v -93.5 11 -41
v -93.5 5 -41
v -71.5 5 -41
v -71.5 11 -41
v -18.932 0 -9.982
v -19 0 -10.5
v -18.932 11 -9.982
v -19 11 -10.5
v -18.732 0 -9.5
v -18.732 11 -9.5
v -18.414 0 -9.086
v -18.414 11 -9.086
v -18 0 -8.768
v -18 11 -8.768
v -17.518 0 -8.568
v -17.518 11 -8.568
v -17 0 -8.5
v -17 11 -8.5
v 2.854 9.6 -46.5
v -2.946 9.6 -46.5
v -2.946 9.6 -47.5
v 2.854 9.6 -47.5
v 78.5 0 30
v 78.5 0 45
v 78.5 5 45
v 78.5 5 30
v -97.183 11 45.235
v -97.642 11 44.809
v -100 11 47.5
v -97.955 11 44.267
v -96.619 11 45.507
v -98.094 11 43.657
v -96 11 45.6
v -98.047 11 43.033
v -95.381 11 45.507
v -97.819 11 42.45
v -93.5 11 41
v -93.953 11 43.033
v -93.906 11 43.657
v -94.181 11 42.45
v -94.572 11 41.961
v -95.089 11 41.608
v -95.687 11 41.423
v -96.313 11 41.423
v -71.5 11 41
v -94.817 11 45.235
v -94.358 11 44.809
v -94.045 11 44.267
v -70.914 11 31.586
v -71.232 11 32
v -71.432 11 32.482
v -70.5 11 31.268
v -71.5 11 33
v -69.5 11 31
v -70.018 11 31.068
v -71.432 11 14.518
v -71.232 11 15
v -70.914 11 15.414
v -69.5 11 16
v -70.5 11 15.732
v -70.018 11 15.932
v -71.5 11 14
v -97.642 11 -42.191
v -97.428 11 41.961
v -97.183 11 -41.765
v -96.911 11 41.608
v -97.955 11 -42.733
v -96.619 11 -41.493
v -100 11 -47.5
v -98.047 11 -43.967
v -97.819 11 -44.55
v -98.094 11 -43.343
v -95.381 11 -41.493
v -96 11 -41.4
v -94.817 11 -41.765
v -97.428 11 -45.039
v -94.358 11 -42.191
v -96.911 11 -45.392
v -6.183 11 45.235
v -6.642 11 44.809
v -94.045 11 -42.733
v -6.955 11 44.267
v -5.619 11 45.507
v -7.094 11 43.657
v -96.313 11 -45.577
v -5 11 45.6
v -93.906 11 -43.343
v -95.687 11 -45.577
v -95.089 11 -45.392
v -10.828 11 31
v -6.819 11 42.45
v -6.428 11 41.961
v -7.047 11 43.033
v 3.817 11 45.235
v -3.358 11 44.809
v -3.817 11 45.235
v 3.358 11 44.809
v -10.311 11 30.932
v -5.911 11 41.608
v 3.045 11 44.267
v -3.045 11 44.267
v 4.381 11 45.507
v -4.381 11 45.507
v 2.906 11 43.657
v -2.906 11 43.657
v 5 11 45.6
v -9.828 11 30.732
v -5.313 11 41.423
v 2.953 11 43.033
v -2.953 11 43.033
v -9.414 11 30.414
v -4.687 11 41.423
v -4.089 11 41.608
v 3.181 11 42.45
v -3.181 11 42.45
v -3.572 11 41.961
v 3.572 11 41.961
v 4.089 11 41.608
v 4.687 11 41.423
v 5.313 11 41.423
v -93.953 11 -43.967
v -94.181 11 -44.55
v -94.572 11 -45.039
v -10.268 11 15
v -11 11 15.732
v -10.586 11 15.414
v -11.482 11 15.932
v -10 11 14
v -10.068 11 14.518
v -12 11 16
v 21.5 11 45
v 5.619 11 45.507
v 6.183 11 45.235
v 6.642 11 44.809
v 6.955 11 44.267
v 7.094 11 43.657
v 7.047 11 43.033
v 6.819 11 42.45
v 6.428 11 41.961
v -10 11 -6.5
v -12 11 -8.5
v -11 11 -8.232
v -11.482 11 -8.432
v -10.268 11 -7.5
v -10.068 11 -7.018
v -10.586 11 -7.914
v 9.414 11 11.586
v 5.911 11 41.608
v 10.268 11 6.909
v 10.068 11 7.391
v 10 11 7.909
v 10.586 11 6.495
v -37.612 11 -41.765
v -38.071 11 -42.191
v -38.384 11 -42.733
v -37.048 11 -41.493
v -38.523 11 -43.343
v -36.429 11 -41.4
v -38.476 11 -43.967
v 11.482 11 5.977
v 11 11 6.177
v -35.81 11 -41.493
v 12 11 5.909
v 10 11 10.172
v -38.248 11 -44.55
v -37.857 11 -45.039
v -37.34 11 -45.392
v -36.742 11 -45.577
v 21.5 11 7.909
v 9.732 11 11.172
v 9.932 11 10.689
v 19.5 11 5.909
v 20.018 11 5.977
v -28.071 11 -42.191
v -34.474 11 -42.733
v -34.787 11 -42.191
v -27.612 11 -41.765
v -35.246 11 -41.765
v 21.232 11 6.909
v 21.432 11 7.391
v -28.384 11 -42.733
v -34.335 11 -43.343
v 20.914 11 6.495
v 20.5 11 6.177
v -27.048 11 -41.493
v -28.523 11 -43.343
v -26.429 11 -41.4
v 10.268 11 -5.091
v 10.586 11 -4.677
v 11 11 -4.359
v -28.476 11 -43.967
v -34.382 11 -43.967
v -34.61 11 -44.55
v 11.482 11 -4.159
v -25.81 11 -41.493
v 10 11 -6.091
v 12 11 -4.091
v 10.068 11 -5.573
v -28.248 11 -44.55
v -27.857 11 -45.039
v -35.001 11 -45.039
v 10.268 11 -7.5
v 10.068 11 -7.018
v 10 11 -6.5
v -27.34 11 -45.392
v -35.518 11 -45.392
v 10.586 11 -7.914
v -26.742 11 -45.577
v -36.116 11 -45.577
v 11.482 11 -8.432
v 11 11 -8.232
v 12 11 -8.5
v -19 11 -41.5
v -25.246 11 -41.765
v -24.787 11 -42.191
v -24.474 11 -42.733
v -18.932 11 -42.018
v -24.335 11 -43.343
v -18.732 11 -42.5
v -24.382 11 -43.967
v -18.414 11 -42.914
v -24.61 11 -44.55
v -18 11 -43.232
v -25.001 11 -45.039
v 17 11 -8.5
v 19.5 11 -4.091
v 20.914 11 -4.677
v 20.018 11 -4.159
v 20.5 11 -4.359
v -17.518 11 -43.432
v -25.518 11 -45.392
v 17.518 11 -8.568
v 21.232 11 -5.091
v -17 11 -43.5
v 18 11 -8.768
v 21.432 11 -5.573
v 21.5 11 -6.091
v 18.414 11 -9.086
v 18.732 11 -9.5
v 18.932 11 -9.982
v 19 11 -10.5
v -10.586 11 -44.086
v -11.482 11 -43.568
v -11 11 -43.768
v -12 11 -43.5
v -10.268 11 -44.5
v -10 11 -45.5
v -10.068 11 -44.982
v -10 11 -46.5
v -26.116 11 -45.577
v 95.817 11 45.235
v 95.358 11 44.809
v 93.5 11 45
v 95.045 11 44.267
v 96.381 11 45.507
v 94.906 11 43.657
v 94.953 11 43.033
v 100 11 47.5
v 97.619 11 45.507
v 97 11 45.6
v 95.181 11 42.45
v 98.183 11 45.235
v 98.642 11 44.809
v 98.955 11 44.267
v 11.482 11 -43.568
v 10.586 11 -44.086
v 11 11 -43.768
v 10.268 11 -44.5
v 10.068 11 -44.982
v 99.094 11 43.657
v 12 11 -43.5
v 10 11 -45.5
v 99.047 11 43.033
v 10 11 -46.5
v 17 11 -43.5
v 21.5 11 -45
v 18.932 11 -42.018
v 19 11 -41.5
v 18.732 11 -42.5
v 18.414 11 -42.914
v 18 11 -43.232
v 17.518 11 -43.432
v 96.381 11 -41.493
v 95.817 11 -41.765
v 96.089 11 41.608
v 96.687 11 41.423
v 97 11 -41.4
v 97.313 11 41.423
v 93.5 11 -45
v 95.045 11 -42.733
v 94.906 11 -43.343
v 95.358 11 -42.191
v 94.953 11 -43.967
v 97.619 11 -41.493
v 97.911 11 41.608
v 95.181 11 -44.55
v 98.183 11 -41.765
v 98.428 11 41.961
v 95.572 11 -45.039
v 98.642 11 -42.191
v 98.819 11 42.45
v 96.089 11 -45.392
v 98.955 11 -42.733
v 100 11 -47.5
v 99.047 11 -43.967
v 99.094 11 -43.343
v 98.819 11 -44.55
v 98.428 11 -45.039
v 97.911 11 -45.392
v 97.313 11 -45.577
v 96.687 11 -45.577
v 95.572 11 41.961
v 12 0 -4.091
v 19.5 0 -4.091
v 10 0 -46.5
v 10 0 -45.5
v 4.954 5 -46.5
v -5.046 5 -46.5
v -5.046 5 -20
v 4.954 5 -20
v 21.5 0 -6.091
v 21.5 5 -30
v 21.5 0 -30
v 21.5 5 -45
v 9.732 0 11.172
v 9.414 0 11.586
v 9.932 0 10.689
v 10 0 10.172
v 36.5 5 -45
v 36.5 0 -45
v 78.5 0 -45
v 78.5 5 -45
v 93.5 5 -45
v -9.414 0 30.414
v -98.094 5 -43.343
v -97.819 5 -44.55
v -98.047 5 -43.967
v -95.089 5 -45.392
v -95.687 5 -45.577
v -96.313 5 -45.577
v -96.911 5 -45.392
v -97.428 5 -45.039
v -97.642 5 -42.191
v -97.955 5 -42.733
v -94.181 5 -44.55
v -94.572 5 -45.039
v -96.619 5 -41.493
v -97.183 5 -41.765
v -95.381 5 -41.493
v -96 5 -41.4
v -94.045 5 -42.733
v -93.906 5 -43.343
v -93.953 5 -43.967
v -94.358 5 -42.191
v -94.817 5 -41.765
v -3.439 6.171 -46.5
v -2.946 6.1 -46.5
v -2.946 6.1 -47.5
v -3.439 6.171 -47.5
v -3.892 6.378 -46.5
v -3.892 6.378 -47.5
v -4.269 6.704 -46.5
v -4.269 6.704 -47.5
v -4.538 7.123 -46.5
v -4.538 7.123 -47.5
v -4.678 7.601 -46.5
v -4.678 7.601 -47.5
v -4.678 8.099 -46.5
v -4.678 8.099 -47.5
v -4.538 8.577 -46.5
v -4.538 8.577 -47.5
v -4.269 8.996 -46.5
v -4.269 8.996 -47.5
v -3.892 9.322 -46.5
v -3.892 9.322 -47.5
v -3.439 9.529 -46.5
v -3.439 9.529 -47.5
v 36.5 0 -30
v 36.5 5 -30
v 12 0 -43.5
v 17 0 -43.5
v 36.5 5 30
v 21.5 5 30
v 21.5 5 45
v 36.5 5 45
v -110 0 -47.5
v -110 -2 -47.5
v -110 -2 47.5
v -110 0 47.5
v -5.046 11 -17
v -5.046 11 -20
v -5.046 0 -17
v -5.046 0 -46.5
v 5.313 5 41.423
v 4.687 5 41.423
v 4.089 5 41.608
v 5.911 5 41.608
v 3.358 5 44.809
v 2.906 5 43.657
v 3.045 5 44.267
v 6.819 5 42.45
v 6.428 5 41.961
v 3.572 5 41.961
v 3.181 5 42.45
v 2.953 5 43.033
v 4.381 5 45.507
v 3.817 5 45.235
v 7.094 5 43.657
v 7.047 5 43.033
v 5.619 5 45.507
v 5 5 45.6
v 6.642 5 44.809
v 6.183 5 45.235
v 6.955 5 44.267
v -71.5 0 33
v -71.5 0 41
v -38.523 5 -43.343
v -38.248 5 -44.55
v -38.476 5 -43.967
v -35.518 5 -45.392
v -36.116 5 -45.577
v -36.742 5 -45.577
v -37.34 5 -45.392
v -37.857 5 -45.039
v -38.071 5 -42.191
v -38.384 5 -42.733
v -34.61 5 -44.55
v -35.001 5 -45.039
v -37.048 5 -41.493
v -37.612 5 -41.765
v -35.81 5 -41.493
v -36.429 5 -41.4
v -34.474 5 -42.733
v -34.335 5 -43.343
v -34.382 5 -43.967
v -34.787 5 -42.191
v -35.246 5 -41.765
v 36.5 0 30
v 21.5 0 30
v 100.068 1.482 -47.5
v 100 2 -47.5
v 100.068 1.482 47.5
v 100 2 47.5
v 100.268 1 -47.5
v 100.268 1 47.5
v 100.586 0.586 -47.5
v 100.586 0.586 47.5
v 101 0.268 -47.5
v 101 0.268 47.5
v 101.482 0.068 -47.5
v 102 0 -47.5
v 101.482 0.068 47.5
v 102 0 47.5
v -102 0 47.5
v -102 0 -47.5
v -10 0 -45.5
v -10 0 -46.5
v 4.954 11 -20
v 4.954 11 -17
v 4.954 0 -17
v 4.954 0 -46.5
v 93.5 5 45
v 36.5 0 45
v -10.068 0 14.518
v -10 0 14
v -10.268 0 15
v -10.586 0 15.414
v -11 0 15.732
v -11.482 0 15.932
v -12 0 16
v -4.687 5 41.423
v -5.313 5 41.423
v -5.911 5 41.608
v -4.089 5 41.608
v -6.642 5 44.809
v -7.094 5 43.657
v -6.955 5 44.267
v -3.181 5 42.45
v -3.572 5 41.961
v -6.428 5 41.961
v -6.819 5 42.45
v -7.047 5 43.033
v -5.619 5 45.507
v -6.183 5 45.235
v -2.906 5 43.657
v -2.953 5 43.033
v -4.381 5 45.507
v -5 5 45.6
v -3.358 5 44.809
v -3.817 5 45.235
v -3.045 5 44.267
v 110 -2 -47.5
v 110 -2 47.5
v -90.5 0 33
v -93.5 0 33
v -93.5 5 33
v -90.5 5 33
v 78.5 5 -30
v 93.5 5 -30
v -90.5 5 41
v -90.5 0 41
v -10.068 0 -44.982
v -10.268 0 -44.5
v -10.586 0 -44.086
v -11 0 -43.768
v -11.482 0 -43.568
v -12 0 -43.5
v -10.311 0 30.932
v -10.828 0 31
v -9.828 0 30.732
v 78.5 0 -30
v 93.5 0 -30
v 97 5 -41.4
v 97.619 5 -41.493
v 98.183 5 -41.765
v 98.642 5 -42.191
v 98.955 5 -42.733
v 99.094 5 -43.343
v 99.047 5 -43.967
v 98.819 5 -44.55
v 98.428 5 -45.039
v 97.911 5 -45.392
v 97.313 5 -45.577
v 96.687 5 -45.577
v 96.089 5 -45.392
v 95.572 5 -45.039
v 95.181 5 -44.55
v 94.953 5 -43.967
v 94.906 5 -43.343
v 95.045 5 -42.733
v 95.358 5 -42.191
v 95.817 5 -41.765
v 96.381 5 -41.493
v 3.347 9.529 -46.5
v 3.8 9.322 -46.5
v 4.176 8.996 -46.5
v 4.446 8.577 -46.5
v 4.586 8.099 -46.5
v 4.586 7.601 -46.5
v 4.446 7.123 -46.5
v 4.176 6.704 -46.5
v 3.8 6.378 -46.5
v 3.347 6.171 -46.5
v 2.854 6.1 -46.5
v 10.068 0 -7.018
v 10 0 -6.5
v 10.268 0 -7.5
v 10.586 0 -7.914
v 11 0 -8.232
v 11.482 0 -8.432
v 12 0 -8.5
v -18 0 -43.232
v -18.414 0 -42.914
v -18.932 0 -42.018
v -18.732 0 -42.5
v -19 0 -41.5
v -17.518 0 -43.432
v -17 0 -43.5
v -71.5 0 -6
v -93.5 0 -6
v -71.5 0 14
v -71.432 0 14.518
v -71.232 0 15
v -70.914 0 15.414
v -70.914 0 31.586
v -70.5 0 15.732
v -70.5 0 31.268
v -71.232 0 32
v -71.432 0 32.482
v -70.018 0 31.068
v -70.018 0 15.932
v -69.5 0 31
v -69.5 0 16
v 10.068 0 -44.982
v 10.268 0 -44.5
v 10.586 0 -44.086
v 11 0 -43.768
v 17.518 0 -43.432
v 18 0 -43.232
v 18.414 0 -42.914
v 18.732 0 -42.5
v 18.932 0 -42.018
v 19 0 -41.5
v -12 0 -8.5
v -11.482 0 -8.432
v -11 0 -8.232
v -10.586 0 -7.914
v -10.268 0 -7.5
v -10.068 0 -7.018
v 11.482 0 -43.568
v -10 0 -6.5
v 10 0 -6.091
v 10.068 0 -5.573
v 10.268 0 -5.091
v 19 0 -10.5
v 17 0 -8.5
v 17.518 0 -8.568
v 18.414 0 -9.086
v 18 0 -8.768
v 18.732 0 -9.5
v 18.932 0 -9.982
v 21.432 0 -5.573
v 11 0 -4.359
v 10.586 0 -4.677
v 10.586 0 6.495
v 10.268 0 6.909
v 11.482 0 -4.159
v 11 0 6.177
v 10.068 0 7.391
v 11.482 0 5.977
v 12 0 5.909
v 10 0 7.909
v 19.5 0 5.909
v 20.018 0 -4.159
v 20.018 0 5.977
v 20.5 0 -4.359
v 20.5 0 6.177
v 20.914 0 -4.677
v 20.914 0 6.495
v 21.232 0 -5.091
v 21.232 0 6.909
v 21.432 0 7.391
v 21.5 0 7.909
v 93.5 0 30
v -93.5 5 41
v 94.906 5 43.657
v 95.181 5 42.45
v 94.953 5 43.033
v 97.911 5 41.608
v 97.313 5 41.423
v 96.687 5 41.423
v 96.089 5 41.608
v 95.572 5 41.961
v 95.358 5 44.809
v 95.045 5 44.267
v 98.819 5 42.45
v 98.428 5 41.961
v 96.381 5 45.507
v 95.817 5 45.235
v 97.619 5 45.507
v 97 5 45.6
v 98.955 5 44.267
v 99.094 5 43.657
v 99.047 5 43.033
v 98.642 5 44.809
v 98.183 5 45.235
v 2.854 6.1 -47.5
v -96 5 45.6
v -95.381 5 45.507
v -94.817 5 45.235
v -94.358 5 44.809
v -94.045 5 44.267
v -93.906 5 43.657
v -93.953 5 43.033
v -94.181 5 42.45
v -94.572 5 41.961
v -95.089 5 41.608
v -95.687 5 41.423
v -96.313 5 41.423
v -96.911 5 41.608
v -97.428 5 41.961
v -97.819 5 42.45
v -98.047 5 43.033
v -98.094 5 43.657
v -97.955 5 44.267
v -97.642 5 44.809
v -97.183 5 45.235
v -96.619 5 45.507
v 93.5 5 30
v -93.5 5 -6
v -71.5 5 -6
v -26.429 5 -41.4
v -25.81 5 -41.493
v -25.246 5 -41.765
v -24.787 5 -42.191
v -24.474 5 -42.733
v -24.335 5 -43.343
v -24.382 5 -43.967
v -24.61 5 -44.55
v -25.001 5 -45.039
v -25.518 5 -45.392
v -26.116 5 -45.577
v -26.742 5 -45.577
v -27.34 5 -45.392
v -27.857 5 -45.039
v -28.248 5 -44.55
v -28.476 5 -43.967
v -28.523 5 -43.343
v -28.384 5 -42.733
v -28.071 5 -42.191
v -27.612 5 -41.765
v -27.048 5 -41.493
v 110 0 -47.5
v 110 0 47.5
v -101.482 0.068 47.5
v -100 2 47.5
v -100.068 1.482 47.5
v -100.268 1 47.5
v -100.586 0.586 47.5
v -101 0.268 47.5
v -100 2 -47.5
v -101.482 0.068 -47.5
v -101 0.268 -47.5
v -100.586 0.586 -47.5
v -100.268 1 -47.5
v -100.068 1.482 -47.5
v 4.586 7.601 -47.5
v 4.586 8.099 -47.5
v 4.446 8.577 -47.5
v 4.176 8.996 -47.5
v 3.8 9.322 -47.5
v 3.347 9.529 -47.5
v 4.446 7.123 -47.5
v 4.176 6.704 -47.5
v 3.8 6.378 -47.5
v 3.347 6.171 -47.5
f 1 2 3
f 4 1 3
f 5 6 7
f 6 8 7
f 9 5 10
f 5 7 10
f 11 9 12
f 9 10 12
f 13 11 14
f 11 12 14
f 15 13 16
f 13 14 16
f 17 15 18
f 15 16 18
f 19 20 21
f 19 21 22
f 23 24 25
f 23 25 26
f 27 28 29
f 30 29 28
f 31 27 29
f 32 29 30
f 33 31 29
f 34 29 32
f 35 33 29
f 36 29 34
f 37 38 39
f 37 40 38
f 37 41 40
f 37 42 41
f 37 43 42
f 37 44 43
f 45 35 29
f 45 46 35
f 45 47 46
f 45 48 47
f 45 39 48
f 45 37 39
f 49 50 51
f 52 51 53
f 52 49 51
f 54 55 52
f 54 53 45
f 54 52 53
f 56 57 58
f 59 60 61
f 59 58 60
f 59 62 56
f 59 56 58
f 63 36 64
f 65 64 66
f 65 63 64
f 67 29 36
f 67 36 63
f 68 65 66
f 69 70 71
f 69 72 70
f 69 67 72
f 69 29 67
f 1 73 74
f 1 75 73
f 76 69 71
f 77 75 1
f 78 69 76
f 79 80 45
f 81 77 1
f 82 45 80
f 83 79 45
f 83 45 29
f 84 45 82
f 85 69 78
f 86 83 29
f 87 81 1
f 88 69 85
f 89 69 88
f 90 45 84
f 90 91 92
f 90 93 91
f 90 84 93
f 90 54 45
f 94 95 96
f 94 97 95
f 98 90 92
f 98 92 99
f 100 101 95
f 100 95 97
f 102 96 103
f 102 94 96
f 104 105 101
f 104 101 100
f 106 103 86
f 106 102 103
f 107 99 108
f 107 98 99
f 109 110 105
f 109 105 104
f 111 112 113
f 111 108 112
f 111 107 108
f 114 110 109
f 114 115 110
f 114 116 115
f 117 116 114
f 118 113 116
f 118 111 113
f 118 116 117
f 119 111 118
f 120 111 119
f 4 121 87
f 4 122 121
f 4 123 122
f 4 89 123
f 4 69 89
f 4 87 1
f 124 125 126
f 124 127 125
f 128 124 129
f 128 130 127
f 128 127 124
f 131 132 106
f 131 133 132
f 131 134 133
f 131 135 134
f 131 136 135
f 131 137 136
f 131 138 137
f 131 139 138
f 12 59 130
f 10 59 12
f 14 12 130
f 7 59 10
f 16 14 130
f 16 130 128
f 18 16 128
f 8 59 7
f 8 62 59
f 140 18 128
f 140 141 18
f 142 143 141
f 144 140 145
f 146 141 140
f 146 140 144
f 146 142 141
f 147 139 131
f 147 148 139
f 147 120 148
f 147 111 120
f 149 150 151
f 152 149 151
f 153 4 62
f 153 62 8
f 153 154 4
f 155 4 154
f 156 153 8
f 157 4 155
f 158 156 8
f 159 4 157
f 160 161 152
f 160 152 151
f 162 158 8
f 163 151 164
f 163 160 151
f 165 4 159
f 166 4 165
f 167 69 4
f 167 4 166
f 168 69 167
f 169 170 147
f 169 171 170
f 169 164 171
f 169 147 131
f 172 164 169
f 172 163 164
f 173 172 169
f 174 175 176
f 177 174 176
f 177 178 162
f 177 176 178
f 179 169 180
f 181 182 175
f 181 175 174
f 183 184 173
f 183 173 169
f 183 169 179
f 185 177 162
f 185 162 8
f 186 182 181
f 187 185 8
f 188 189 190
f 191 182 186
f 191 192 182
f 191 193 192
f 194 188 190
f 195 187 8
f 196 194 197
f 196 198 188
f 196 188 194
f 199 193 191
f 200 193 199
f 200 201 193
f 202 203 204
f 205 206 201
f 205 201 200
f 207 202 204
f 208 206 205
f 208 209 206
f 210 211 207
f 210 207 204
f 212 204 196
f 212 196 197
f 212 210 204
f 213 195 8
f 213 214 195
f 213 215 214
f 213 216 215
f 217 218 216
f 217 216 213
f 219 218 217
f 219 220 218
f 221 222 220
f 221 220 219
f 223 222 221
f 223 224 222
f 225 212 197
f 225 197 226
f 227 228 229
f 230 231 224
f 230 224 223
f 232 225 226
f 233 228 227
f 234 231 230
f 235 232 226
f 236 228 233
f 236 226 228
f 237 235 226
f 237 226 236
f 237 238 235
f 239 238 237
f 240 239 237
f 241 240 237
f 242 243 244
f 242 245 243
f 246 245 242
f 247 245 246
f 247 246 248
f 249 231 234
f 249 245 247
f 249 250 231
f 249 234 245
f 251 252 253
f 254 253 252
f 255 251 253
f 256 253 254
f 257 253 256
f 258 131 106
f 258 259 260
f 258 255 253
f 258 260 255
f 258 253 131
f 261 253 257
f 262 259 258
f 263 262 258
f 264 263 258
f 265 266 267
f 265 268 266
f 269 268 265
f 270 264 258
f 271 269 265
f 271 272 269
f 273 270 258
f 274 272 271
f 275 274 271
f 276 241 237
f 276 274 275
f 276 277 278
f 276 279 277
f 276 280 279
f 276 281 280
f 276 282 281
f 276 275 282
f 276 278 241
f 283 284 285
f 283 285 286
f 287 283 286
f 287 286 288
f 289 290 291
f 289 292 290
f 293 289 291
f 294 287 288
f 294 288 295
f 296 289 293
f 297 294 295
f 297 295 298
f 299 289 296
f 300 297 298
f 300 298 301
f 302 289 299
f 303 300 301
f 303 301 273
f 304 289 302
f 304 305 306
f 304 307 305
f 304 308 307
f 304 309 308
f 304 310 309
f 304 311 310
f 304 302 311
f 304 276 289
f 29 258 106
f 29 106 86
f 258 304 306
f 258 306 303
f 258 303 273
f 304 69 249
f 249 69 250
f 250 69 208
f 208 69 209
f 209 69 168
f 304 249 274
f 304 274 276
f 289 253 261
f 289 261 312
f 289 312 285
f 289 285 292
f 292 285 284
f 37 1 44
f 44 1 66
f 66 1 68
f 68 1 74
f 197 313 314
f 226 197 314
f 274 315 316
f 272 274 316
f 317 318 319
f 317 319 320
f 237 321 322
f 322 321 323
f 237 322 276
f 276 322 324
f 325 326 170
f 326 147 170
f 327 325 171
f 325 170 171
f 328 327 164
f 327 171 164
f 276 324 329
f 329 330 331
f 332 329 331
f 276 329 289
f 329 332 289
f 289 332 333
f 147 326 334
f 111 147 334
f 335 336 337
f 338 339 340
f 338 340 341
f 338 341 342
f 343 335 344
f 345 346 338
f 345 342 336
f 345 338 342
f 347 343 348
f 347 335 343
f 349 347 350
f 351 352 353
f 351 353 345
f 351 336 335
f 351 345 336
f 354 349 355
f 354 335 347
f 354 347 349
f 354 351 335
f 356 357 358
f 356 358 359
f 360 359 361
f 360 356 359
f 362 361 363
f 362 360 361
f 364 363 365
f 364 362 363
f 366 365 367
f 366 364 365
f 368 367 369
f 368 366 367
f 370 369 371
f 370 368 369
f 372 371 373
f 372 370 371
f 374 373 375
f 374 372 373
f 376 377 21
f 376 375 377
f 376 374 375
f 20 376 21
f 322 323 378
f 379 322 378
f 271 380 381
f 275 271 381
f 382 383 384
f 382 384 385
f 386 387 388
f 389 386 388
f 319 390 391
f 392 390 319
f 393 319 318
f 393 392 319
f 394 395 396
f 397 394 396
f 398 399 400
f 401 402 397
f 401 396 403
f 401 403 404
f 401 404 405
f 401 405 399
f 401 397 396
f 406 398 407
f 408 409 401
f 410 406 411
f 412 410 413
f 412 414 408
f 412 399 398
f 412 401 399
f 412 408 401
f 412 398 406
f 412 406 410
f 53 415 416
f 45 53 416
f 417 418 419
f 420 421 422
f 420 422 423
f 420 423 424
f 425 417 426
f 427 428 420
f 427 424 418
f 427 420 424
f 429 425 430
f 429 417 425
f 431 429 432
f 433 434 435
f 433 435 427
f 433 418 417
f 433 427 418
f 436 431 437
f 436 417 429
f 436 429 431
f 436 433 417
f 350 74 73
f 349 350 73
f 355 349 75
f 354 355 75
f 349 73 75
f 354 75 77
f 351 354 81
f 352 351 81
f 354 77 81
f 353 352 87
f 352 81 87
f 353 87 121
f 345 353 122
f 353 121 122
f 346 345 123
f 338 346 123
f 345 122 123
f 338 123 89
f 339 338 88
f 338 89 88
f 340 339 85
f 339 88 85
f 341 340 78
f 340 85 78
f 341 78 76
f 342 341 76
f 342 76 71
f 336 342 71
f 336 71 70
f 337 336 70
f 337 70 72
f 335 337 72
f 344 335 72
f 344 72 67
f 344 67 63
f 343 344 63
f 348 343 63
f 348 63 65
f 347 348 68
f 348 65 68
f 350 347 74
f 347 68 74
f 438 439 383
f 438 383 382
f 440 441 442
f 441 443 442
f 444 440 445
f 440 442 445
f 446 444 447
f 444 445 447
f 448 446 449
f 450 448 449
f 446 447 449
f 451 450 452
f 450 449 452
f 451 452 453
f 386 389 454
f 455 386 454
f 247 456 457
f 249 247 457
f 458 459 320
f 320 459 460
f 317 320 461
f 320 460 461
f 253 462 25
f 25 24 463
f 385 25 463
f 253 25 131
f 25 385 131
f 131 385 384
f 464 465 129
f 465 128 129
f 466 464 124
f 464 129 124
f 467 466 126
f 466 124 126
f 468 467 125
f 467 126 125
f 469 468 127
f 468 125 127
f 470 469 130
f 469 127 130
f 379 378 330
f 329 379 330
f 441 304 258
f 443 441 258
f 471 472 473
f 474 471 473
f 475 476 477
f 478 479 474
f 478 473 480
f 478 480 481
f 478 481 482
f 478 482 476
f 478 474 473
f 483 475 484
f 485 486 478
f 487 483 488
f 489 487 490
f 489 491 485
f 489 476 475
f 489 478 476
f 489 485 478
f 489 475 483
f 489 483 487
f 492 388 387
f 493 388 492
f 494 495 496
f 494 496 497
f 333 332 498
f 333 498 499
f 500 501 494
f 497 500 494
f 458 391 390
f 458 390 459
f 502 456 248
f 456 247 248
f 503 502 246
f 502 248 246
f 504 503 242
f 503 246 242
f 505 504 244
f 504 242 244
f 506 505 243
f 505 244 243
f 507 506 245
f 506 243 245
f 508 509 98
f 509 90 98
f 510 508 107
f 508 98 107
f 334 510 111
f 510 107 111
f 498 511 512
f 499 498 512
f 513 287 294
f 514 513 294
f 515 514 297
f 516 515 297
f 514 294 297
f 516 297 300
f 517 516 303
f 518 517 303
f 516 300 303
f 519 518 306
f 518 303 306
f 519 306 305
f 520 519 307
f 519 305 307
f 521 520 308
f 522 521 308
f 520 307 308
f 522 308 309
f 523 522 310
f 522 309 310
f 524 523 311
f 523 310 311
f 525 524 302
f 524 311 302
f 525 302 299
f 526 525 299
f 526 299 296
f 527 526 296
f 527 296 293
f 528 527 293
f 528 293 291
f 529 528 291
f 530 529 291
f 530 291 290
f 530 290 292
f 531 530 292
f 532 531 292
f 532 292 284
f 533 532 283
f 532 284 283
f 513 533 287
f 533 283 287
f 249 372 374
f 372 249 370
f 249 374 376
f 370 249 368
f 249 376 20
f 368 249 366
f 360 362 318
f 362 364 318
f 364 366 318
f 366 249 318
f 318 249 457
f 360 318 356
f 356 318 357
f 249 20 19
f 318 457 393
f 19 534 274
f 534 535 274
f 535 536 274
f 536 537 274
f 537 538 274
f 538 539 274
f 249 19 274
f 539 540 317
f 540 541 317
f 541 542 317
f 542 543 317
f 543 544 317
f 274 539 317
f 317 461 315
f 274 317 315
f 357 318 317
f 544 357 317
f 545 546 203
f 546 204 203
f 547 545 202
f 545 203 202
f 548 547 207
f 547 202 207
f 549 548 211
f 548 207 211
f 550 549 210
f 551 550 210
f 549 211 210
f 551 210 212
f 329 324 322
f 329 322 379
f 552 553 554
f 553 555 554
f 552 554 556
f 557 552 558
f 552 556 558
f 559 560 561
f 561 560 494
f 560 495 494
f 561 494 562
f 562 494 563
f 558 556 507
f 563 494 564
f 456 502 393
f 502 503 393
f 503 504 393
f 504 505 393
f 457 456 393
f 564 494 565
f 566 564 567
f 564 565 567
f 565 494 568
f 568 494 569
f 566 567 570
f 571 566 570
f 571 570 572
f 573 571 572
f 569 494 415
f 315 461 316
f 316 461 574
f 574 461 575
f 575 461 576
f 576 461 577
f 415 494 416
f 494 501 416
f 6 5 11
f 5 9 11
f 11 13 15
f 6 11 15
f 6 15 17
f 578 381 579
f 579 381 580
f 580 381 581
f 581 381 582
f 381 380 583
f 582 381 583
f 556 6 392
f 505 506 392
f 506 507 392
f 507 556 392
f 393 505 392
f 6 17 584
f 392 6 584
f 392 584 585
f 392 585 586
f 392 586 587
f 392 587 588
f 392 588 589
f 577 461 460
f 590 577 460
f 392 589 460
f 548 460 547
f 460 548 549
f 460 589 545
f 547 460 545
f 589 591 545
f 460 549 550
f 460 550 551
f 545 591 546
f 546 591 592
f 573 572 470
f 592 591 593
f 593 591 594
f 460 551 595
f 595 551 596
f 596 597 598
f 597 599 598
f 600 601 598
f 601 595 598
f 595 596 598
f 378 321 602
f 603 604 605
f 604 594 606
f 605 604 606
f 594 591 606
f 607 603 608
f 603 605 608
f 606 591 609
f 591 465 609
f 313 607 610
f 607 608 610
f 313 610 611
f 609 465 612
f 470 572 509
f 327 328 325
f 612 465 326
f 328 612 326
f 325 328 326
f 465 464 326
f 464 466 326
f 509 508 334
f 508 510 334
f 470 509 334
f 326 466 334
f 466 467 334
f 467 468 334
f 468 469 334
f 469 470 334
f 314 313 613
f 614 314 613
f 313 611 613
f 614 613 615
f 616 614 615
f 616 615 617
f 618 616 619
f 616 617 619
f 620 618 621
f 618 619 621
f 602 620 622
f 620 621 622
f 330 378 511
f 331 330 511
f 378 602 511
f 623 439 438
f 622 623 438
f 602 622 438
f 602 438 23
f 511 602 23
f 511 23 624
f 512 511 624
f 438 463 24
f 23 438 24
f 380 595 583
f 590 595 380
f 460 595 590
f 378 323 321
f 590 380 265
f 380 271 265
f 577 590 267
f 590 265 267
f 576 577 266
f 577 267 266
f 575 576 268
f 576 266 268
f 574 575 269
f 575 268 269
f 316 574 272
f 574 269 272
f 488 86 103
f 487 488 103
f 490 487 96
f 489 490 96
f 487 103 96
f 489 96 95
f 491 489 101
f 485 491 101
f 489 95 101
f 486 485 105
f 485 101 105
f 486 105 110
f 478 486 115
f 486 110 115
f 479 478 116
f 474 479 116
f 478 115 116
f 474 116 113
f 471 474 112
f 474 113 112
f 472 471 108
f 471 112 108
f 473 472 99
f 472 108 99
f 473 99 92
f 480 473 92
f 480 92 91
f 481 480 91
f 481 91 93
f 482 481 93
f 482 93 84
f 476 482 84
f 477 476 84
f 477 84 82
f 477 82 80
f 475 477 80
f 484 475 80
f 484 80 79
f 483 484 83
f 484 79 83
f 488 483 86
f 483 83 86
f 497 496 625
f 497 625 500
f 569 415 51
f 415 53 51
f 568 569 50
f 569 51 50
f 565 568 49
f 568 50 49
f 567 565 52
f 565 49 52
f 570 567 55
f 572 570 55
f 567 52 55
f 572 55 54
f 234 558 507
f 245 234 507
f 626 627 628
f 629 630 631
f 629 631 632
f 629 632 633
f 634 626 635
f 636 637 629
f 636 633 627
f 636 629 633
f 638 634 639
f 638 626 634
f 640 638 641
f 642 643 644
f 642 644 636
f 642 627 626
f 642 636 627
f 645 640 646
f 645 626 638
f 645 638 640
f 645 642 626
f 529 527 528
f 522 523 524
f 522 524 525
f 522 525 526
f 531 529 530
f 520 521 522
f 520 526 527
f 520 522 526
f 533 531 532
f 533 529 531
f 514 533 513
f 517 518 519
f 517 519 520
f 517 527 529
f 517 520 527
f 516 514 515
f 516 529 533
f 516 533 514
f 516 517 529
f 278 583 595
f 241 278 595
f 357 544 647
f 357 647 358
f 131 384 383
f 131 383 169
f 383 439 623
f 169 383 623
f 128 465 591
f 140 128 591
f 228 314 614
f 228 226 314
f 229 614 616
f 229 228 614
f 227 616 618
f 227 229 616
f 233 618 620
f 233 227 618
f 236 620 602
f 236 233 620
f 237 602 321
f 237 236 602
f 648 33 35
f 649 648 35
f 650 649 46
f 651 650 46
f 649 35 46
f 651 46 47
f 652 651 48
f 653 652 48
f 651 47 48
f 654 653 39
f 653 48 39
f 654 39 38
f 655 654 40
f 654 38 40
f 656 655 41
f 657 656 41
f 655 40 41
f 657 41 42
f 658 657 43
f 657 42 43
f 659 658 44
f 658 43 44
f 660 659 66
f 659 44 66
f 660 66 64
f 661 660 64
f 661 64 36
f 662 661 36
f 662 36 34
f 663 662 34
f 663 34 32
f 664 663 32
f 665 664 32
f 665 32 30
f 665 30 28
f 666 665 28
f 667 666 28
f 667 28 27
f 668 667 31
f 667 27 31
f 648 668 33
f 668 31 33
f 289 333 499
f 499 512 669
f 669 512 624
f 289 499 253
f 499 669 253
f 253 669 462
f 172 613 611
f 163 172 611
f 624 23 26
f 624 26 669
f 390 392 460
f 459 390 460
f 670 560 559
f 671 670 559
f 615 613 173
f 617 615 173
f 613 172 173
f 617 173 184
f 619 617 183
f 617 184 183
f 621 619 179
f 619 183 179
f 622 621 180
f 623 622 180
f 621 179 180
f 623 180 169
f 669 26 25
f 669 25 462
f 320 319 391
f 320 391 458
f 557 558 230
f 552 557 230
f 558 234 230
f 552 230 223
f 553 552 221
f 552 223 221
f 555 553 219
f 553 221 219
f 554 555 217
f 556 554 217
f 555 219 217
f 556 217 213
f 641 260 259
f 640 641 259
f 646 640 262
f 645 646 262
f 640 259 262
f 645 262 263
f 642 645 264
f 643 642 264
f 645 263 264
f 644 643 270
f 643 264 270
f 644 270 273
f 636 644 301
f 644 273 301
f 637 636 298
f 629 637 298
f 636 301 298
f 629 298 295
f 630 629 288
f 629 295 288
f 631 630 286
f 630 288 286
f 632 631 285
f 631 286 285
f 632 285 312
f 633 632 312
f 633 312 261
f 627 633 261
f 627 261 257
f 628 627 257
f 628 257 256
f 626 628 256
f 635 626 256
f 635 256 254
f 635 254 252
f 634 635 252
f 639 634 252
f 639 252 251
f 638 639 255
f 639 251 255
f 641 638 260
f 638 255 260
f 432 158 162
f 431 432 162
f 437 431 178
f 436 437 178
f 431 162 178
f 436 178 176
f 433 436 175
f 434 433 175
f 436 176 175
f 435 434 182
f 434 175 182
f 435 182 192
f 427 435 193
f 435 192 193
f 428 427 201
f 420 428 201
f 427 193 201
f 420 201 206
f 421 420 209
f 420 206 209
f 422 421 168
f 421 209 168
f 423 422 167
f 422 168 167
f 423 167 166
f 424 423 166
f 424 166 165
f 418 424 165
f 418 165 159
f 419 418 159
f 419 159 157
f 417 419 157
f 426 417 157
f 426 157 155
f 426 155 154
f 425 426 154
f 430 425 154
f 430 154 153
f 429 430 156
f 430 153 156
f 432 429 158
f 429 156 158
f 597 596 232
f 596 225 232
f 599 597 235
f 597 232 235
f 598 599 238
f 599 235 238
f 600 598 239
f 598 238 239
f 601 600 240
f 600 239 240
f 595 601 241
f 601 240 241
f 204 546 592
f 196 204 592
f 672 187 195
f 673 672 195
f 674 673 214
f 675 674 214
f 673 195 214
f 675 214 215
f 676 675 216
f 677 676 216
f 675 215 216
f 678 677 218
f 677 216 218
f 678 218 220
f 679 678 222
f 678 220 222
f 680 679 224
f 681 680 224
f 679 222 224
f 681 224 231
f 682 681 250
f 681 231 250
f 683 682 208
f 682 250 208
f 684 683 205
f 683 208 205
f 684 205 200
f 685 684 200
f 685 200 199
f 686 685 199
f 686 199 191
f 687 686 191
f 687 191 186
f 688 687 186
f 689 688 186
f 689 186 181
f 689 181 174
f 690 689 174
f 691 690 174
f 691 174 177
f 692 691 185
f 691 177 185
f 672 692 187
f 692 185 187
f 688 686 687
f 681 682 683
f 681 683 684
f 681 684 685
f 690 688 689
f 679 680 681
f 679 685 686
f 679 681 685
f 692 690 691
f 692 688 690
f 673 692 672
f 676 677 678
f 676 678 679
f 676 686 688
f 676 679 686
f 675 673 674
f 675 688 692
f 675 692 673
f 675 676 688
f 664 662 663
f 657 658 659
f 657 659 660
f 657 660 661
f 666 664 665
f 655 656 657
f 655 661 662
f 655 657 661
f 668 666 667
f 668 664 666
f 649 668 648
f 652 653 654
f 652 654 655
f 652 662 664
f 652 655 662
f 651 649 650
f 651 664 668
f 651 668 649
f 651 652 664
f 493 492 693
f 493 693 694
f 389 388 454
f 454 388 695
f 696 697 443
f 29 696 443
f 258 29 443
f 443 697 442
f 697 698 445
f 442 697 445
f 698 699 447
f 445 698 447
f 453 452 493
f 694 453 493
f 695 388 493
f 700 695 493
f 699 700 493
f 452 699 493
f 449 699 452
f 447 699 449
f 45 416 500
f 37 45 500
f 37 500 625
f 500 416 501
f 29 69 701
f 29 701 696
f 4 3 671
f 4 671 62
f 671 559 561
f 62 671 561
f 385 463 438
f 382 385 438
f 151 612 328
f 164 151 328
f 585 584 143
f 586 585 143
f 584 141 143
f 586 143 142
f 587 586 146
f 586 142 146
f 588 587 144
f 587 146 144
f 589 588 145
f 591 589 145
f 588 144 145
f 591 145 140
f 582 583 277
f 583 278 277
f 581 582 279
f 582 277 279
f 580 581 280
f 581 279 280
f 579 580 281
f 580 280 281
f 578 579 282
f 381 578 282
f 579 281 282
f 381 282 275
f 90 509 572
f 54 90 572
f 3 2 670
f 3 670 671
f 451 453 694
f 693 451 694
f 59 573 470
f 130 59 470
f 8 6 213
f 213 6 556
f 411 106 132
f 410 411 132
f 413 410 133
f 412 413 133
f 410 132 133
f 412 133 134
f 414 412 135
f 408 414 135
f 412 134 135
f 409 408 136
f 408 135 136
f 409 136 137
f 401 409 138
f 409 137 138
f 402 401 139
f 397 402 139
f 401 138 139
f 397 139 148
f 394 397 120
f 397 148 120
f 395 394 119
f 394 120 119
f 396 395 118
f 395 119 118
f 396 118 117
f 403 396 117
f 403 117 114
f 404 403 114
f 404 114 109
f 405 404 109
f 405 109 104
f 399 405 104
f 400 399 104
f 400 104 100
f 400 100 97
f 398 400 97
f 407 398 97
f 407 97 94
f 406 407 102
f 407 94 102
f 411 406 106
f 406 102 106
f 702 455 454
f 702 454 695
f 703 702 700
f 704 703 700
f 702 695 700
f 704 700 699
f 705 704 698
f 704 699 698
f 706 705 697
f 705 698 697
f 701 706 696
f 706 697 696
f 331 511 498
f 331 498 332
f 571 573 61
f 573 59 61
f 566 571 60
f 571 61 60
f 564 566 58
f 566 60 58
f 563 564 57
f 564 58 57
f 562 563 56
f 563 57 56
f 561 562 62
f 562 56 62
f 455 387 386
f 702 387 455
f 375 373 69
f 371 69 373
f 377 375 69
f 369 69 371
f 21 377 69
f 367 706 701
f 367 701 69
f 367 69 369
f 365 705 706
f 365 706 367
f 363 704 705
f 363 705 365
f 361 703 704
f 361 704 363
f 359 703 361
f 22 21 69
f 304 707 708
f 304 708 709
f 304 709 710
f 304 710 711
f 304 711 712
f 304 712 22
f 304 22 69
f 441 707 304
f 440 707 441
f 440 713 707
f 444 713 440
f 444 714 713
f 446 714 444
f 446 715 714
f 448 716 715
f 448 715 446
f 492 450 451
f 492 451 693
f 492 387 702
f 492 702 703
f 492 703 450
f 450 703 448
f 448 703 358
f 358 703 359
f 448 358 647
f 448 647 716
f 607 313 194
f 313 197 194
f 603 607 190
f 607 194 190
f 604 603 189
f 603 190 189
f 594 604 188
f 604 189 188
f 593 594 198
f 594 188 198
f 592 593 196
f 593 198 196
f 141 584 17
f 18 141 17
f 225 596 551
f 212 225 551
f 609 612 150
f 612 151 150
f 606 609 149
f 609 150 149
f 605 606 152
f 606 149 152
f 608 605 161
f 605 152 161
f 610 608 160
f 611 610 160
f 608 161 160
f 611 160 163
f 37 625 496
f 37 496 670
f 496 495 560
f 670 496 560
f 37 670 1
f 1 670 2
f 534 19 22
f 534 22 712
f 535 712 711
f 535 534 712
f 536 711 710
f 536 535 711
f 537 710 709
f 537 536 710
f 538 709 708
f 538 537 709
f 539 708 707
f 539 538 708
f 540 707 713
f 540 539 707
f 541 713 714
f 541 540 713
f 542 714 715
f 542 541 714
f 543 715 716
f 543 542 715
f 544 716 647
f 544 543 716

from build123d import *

# Parameters (mm, degrees)
SKETCH2_W           = 200
SKETCH2_H           = 95
BOSS_EXTRUDE1_DEPTH = 11
SKETCH3_W           = 200
SKETCH3_H           = 95
BOSS_EXTRUDE2_DEPTH = 2
SKETCH4_W           = 22
SKETCH4_H           = 35
SKETCH4_W_2         = 10
SKETCH4_H_2         = 26.5
SKETCH4_W_3         = 3
SKETCH4_H_3         = 8
SKETCH4_W_4         = 15
SKETCH4_H_4         = 15
BOSS_EXTRUDE3_DEPTH = 5
CUT_EXTRUDE1_DEPTH  = 7
SKETCH9_W           = 10
SKETCH9_H           = 3
BOSS_EXTRUDE4_DEPTH = 11
SKETCH7_W           = 220
SKETCH7_H           = 95
BOSS_EXTRUDE5_DEPTH = 2
FILLET1_R           = 2
FILLET2_R           = 2
SKETCH10_R          = 2.1
CUT_EXTRUDE2_DEPTH  = 6


with BuildPart() as part:
    # Sketch2 → Boss-Extrude1 (new body)
    with BuildSketch(Plane(origin=(0, 0, 0), x_dir=(1, 0, 0), z_dir=(0, 1, 0))):
        Rectangle(SKETCH2_W, SKETCH2_H)
        Polygon((21.5, 4.091136268), (21.5, 45), (93.5, 45), (93.5, -45), (21.5, -45), (21.5, -5.908863732), (10, -5.908863732), (10, -11), (-10, -31), (-71.5, -31), (-71.5, -41), (-93.5, -41), (-93.5, 41), (-71.5, 41), (-71.5, -16), (-10, -16), (-10, 8.5), (-19, 8.5), (-19, 43.5), (-10, 43.5), (-10, 46.5), (10, 46.5), (10, 43.5), (19, 43.5), (19, 8.5), (10, 8.5), (10, 4.091136268), align=None, mode=Mode.SUBTRACT)
    extrude(amount=BOSS_EXTRUDE1_DEPTH)

    # Sketch3 → Boss-Extrude2 (add)
    with BuildSketch(Plane.XZ):
        Rectangle(SKETCH3_W, SKETCH3_H)
    extrude(amount=BOSS_EXTRUDE2_DEPTH)

    # Sketch4 → Boss-Extrude3 (add)
    with BuildSketch(Plane(origin=(0, 0, 0), x_dir=(1, 0, 0), z_dir=(0, 1, 0))):
        with Locations((-82.5, 23.5)):
            Rectangle(SKETCH4_W, SKETCH4_H)
        with Locations((-0.04618168, 33.25)):
            Rectangle(SKETCH4_W_2, SKETCH4_H_2)
        with Locations((-92, -37)):
            Rectangle(SKETCH4_W_3, SKETCH4_H_3)
        with Locations((29, 37.5)):
            Rectangle(SKETCH4_W_4, SKETCH4_H_4)
        with Locations((86, 37.5)):
            Rectangle(SKETCH4_W_4, SKETCH4_H_4)
        with Locations((86, -37.5)):
            Rectangle(SKETCH4_W_4, SKETCH4_H_4)
        with Locations((29, -37.5)):
            Rectangle(SKETCH4_W_4, SKETCH4_H_4)
    extrude(amount=BOSS_EXTRUDE3_DEPTH)

    # Sketch5 → Cut-Extrude1 (cut)
    with BuildSketch(Plane.XY.offset(-46.5)):
        with BuildLine():
            Line((-2.94618168, 9.6), (2.85381832, 9.6))
            ThreePointArc((2.85381832, 9.6), (4.60381832, 7.85), (2.85381832, 6.1))
            Line((2.85381832, 6.1), (-2.94618168, 6.1))
            ThreePointArc((-2.94618168, 6.1), (-4.69618168, 7.85), (-2.94618168, 9.6))
        make_face()
    extrude(amount=-CUT_EXTRUDE1_DEPTH, mode=Mode.SUBTRACT)

    # Sketch9 → Boss-Extrude4 (add)
    with BuildSketch(Plane(origin=(0, 0, 0), x_dir=(1, 0, 0), z_dir=(0, 1, 0))):
        with Locations((-0.04618168, 18.5)):
            Rectangle(SKETCH9_W, SKETCH9_H)
    extrude(amount=BOSS_EXTRUDE4_DEPTH)

    # Sketch7 → Boss-Extrude5 (add)
    with BuildSketch(Plane.XZ.offset(2)):
        Rectangle(SKETCH7_W, SKETCH7_H)
    extrude(amount=-BOSS_EXTRUDE5_DEPTH)

    # Fillet1
    fillet1_edges = [part.edges().sort_by_distance(p)[0] for p in [
        (100, 0, 0),
        (-100, 0, 0),
    ]]
    fillet(fillet1_edges, radius=FILLET1_R)

    # Fillet2
    fillet2_edges = [part.edges().sort_by_distance(p)[0] for p in [
        (10, 5.5, -43.5),
        (-10, 5.5, -43.5),
        (-19, 5.5, -43.5),
        (-19, 5.5, -8.5),
        (-10, 5.5, -8.5),
        (-10, 5.5, 16),
        (-71.5, 5.5, 16),
        (-71.5, 5.5, 31),
        (-10, 5.5, 31),
        (10, 5.5, 11),
        (10, 5.5, 5.908863732),
        (21.5, 5.5, 5.908863732),
        (21.5, 5.5, -4.091136268),
        (10, 5.5, -4.091136268),
        (10, 5.5, -8.5),
        (19, 5.5, -8.5),
        (19, 5.5, -43.5),
    ]]
    fillet(fillet2_edges, radius=FILLET2_R)

    # Sketch10 → Cut-Extrude2 (cut)
    with BuildSketch(Plane(origin=(0, 11, 0), x_dir=(1, 0, 0), z_dir=(0, 1, 0))):
        with Locations(Location((-96, -43.5, 0), (0, 0, 270))):
            Circle(SKETCH10_R)
        with Locations(Location((-5, -43.5, 0), (0, 0, 270))):
            Circle(SKETCH10_R)
        with Locations(Location((5, -43.5, 0), (0, 0, 270))):
            Circle(SKETCH10_R)
        with Locations(Location((97, -43.5, 0), (0, 0, 270))):
            Circle(SKETCH10_R)
        with Locations(Location((97, 43.5, 0), (0, 0, 270))):
            Circle(SKETCH10_R)
        with Locations(Location((-26.428932188, 43.5, 0), (0, 0, 270))):
            Circle(SKETCH10_R)
        with Locations(Location((-36.428932188, 43.5, 0), (0, 0, 270))):
            Circle(SKETCH10_R)
        with Locations(Location((-96, 43.5, 0), (0, 0, 270))):
            Circle(SKETCH10_R)
    extrude(amount=-CUT_EXTRUDE2_DEPTH, mode=Mode.SUBTRACT)


solid = part.part
